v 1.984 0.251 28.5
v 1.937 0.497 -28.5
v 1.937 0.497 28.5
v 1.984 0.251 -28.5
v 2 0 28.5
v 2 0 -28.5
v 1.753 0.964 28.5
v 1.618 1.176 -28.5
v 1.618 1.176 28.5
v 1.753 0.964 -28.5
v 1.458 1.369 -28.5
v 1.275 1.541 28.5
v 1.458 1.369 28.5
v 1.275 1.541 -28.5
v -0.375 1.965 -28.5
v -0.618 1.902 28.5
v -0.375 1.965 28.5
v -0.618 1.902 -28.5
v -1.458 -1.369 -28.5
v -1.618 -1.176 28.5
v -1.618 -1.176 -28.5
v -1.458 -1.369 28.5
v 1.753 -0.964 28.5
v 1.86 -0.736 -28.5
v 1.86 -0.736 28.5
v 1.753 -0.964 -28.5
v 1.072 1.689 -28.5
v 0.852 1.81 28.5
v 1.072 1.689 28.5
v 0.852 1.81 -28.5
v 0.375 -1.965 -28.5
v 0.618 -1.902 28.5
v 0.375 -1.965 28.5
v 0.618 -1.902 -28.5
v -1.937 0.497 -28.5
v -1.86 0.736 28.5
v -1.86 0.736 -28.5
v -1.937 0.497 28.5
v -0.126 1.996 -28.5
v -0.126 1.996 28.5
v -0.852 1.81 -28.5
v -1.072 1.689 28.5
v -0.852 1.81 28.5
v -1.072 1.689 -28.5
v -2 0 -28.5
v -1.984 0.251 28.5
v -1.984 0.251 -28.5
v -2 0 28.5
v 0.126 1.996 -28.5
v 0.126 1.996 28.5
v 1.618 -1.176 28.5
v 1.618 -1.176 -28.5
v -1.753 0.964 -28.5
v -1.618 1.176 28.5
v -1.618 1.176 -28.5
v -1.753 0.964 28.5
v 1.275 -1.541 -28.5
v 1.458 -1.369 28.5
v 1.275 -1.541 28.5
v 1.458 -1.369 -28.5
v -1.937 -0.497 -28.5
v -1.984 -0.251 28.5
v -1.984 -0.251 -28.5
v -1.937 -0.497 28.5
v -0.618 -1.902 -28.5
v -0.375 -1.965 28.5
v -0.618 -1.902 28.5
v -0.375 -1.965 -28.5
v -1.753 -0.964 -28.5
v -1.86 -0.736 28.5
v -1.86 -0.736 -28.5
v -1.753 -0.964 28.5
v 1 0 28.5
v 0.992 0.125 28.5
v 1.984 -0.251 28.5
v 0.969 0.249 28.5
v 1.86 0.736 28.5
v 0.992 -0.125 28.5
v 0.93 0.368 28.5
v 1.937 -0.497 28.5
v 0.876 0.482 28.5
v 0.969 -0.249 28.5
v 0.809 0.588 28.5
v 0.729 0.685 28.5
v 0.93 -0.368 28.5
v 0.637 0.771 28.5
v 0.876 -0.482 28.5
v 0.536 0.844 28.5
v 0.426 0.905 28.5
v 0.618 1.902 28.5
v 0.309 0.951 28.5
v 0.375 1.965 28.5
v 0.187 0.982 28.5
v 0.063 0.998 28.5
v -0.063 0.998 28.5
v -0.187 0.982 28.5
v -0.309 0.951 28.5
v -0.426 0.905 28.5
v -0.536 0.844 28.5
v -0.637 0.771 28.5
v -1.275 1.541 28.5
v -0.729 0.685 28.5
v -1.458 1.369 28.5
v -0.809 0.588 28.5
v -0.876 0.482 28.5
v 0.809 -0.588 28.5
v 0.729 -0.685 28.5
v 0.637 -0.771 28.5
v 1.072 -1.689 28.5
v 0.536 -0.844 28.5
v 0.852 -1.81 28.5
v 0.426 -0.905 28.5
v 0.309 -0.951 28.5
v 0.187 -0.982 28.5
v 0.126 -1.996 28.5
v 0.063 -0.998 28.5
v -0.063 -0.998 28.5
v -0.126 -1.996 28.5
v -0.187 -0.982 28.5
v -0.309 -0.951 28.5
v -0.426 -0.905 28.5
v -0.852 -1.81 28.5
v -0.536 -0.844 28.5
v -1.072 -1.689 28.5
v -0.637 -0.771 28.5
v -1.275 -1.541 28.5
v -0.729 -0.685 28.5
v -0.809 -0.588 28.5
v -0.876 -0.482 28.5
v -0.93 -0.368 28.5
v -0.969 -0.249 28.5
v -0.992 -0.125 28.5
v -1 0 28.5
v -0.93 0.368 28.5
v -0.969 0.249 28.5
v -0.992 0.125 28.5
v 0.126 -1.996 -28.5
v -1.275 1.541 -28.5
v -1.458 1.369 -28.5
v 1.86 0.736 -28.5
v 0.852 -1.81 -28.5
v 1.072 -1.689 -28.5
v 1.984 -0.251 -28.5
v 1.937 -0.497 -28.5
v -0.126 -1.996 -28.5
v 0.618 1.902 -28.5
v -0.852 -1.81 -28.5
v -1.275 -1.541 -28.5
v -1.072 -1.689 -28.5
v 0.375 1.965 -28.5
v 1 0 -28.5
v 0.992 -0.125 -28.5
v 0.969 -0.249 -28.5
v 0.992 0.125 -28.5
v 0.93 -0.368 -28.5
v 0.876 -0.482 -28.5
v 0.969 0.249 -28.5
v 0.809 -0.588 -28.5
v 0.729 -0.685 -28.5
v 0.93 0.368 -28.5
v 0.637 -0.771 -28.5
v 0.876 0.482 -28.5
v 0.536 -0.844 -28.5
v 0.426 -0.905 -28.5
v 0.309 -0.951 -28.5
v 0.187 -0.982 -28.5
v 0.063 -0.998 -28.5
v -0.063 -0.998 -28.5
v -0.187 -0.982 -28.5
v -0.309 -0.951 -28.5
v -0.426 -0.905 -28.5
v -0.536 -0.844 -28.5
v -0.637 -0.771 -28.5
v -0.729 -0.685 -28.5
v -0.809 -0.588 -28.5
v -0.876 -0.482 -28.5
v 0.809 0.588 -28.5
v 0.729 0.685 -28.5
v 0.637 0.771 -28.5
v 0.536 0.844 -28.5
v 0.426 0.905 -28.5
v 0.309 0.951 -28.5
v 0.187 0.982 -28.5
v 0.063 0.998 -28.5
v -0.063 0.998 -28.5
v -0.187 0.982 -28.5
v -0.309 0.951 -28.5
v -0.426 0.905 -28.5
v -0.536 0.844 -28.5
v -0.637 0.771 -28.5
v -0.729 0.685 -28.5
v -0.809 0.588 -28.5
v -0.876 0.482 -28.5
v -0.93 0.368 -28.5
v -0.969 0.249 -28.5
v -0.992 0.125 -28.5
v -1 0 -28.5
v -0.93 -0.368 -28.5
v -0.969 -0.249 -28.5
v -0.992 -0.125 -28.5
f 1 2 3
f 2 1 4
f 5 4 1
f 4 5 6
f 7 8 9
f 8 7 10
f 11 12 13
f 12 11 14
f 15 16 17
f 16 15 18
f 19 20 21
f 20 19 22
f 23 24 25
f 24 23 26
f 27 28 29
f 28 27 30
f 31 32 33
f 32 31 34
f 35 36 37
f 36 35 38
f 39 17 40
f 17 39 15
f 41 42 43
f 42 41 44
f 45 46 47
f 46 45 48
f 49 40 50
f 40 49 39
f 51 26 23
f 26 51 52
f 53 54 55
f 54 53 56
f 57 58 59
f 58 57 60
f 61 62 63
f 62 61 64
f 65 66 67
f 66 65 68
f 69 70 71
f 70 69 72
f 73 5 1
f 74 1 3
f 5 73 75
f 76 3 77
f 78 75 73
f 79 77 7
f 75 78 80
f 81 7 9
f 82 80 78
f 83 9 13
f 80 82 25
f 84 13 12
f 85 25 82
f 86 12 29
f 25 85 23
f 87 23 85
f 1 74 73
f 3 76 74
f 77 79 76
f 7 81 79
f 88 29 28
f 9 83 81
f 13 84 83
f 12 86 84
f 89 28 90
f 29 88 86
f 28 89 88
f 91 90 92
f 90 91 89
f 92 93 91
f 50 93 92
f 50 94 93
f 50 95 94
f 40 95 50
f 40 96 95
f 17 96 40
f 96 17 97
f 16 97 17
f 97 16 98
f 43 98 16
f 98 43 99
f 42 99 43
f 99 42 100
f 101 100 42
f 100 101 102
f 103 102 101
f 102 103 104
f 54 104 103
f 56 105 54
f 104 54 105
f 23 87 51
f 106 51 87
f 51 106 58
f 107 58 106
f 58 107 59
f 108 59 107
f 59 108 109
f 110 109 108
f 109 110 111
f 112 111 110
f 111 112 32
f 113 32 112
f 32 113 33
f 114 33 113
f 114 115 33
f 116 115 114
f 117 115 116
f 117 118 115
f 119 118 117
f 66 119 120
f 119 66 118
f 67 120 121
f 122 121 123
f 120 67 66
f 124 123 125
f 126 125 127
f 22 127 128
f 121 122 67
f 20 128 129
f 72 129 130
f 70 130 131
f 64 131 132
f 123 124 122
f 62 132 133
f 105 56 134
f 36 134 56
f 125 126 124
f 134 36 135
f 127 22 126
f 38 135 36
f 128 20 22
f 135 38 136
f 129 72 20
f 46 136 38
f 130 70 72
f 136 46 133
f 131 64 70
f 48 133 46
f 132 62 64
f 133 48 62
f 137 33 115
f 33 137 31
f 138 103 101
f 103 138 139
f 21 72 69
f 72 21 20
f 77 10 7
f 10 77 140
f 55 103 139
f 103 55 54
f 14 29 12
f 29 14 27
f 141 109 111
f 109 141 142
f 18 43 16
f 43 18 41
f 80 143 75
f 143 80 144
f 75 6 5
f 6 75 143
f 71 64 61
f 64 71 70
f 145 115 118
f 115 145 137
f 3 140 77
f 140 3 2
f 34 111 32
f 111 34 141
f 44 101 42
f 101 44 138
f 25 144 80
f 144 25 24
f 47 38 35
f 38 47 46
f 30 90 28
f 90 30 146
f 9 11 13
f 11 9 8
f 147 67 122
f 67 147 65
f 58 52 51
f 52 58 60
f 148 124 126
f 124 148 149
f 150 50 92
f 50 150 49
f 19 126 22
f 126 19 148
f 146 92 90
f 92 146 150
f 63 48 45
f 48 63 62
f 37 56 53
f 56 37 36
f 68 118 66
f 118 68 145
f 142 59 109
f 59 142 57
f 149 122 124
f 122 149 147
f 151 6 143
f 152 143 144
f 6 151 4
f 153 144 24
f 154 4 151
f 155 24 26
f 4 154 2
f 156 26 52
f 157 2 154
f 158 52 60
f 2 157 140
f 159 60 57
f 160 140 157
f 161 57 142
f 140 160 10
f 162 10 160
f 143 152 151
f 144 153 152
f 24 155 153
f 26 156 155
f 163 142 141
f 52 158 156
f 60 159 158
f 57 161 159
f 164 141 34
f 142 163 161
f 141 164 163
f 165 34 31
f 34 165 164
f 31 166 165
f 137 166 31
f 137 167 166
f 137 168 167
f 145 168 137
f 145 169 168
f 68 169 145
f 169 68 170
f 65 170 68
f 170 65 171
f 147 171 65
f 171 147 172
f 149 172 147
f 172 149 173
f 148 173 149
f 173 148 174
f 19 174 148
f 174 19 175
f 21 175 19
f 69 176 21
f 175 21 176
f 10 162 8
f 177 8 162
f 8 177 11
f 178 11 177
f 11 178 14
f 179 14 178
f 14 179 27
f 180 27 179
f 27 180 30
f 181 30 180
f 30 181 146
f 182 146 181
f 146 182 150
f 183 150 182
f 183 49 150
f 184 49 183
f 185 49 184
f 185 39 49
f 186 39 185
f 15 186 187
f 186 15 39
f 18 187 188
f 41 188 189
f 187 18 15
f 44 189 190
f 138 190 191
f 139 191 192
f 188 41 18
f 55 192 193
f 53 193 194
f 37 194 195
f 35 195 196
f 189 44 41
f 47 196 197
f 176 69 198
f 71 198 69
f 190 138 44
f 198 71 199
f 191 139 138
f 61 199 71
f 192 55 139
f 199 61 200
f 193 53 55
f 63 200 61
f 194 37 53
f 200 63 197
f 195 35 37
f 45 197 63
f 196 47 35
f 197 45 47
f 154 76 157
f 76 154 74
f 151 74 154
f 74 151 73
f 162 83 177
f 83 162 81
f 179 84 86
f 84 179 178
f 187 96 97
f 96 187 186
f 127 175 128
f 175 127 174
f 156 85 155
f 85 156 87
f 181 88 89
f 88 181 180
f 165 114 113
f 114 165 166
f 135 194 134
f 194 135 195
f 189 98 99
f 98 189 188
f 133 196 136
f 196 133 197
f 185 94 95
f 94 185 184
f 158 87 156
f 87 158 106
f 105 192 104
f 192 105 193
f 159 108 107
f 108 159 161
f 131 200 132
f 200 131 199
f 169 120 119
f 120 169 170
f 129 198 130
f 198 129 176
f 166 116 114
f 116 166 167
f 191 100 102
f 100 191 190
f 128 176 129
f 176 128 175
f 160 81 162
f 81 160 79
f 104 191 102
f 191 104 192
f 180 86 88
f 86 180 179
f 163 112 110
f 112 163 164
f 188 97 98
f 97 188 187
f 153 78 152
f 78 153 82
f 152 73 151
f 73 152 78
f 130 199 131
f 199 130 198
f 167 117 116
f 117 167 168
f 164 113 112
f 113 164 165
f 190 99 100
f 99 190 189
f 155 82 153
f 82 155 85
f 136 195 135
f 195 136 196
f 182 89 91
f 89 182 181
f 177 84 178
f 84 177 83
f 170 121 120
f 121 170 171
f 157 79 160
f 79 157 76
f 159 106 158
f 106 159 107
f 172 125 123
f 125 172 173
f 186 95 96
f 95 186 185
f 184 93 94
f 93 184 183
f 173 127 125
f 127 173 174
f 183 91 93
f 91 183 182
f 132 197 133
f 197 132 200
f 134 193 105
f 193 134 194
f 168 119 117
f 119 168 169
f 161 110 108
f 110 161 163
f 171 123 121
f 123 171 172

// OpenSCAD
$fn = 50;


difference() {
	union() {
		translate(v = [0, 0, -28.5000000000]) {
			cylinder(h = 57, r = 2.0000000000);
		}
	}
	union() {
		translate(v = [0, 0, -100.0000000000]) {
			cylinder(h = 200, r = 1.0000000000);
		}
	}
}
